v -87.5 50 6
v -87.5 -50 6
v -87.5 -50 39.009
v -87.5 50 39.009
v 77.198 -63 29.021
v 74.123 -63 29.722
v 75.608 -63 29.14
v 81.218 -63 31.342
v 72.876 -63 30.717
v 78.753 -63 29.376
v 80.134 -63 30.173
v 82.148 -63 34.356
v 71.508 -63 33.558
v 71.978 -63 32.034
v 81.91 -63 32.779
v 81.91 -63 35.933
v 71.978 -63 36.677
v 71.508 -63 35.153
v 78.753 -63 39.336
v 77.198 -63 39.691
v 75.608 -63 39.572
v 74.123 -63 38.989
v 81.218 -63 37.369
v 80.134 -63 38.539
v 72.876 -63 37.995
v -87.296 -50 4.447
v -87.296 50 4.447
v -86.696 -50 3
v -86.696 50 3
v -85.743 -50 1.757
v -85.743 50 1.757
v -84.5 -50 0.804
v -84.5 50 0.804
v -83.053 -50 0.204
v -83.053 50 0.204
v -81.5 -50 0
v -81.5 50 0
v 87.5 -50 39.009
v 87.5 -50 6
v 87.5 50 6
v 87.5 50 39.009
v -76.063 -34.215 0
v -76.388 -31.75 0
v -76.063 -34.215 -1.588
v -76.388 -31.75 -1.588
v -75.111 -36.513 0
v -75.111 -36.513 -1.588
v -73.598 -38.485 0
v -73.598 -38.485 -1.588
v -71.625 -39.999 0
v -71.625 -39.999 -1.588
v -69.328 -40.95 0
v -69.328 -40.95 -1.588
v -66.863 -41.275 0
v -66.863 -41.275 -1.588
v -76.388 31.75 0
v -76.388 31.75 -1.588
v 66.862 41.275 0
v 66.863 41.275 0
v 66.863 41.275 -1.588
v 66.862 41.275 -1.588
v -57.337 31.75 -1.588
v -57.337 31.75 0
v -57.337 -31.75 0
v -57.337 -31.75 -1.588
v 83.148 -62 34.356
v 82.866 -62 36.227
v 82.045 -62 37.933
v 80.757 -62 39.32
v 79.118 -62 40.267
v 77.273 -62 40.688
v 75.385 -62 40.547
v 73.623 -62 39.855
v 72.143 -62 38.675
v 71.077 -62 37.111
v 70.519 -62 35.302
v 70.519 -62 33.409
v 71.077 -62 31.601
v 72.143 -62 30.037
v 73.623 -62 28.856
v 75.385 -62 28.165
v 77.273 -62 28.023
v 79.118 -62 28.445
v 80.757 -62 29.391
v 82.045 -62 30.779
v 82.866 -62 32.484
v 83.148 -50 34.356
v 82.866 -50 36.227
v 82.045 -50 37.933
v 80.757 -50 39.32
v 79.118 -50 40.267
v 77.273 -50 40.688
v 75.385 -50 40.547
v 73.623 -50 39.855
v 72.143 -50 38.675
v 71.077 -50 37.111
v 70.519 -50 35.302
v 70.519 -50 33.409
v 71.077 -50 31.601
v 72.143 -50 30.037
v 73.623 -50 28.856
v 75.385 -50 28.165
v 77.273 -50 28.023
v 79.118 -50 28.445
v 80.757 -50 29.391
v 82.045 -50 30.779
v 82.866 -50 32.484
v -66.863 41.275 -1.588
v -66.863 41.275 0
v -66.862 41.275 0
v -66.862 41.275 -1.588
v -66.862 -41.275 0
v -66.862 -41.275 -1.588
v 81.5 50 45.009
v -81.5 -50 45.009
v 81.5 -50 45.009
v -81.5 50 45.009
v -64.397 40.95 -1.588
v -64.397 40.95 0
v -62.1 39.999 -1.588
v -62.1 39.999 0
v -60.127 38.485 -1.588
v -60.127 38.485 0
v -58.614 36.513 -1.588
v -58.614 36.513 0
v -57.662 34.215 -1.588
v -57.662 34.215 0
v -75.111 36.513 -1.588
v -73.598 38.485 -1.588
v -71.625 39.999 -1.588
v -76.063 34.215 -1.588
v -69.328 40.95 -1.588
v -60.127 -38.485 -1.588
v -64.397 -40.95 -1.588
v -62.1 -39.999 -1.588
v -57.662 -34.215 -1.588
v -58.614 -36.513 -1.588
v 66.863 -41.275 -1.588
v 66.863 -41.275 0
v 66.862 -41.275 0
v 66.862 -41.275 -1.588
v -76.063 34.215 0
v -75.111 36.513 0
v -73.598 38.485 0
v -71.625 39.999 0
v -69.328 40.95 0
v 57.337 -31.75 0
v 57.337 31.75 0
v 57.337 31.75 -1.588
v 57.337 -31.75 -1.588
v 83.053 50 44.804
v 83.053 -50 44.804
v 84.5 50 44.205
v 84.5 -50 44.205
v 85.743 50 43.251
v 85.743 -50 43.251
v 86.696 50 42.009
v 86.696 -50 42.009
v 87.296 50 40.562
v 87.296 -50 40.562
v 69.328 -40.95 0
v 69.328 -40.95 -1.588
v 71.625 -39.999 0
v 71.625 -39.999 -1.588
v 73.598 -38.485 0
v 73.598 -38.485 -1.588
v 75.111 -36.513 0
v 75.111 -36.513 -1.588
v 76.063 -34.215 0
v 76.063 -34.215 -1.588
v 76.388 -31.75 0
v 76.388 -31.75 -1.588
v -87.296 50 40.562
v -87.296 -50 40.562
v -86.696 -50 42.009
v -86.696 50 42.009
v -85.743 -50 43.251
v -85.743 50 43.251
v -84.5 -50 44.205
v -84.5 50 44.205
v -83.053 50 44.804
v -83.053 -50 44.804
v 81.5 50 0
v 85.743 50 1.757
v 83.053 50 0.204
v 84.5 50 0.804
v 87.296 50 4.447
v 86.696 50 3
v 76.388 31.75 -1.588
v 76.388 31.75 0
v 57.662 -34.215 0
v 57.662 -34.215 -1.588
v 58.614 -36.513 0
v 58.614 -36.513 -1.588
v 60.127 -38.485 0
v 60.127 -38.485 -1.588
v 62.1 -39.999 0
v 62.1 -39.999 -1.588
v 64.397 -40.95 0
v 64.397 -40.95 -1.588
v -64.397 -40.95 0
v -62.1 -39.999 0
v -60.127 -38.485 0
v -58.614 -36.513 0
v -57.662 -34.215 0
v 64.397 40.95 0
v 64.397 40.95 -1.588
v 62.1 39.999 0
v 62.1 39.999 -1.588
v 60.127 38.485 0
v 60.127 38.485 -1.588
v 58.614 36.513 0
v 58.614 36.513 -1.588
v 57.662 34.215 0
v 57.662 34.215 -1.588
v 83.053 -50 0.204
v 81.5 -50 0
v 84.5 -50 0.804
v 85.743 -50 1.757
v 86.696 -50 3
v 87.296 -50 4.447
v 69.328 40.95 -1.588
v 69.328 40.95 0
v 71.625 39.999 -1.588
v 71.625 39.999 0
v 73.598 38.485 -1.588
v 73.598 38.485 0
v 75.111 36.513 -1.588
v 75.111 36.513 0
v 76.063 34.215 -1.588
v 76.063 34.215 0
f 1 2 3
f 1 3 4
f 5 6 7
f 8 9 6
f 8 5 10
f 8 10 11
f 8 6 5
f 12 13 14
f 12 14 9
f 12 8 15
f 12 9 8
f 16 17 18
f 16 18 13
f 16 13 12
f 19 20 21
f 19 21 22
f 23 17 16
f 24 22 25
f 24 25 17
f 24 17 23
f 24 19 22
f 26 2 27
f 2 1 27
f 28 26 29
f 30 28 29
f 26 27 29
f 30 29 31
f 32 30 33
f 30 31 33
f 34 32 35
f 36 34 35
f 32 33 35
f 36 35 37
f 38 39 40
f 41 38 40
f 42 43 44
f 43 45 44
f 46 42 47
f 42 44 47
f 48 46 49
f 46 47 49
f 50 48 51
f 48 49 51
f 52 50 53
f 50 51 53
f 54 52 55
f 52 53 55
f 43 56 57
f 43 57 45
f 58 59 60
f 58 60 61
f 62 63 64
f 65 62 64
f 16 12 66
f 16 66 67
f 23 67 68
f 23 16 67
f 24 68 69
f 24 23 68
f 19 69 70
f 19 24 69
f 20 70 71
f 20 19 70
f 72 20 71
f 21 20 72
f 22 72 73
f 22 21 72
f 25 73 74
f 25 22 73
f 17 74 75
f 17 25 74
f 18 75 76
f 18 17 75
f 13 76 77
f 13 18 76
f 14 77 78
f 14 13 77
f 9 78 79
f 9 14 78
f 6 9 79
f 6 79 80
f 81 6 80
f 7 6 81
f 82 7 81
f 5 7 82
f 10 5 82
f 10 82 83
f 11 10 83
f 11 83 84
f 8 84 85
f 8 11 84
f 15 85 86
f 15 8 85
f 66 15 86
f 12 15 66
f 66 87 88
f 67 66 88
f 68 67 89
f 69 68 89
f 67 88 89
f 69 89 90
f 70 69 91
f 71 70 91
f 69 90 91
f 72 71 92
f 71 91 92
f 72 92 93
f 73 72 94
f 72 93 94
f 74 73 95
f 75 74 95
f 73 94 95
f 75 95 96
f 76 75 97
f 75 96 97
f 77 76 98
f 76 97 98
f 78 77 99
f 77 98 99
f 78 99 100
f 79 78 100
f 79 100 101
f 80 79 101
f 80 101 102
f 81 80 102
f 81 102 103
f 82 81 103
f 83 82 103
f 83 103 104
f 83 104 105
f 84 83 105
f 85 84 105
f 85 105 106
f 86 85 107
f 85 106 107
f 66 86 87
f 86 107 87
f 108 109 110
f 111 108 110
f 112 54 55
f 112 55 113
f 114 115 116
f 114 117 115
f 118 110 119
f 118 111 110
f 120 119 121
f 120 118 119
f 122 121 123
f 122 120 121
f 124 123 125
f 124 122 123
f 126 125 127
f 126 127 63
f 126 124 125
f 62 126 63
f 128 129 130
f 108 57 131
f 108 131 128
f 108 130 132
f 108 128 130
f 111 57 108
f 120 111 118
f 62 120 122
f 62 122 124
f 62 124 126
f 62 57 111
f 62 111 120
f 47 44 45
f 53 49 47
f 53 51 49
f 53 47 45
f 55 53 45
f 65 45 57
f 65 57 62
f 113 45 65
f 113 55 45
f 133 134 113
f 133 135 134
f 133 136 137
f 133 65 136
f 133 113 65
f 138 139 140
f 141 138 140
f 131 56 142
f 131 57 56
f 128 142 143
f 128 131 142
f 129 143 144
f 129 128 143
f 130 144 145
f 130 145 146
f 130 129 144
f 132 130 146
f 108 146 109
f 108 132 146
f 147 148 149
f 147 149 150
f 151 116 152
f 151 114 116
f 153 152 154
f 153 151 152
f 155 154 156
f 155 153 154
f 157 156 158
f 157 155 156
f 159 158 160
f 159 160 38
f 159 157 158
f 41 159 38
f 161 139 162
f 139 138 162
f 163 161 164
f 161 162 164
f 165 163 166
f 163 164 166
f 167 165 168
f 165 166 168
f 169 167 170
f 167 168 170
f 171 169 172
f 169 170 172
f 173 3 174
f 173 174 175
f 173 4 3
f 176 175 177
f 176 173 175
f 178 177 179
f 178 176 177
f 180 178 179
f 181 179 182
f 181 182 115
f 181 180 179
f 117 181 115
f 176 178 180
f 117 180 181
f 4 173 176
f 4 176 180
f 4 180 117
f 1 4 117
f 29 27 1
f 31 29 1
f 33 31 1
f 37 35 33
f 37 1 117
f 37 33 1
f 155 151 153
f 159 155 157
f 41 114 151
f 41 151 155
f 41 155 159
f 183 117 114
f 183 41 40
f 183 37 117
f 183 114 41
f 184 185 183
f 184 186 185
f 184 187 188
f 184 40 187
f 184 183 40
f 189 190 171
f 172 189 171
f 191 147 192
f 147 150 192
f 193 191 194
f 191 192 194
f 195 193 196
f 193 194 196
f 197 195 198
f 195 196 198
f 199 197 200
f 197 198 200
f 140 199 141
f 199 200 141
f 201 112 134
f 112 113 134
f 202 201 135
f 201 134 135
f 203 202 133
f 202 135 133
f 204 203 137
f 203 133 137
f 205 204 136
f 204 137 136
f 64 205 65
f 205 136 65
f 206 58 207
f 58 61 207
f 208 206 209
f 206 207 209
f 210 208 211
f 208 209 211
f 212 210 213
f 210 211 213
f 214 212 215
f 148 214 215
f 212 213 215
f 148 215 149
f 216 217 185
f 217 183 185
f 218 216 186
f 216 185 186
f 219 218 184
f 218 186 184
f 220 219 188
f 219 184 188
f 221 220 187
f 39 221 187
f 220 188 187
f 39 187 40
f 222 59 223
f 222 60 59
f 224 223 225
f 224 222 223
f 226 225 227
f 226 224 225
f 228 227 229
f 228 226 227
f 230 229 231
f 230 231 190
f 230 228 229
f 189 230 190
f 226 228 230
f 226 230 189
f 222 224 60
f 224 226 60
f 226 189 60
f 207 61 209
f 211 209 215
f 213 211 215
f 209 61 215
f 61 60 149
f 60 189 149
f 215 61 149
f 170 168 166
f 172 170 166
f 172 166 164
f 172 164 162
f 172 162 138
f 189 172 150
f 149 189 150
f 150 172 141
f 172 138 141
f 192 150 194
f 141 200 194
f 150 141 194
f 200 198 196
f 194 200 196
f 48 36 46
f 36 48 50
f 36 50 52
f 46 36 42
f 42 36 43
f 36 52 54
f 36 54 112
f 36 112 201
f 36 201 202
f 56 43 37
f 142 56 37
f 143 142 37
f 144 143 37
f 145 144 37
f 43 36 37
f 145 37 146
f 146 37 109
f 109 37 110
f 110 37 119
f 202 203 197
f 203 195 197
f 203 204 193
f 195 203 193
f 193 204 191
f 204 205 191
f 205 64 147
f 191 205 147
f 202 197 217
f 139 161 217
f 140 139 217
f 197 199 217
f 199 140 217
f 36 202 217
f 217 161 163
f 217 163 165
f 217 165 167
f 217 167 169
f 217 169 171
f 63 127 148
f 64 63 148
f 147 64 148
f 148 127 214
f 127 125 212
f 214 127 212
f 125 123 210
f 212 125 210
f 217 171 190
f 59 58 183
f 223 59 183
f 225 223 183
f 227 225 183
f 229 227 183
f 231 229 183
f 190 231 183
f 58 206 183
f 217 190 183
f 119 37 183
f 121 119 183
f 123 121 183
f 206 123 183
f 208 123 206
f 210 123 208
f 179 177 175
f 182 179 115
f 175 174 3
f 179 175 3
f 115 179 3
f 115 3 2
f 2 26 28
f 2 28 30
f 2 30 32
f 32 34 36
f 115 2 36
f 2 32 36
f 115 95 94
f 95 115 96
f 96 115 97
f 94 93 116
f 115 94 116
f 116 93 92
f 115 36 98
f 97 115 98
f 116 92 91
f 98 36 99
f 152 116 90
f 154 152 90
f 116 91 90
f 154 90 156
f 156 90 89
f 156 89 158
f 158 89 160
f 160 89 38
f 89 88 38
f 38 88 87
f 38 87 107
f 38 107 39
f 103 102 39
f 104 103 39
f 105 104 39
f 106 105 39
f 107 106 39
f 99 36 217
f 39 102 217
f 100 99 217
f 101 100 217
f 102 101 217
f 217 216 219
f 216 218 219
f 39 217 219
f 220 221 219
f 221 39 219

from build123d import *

# Parameters (mm, degrees)
F0_W     = 175
F0_H     = 100
F1_DEPTH = 45.0088
F2_R     = 6.35
F3_DEPTH = 13
F4_SIZE  = 1
F5_R     = 6
F6_W     = 19.05
F6_H     = 82.55
F7_DEPTH = 1.5875
F8_R     = 9.52499


# Not quite as in the source:
# - a fillet or chamfer is up to 0.001 mm smaller than in the source, because OpenCascade refuses the exact size
# - a length typed as a fraction of an inch, garbled in the dataset ("3 / 203.2 mm" for 3/8 in), is restored
# - a pattern or mirror of a feature is missing from the dataset's text; its kind, count and spacing are read off the source's solid


with BuildPart() as f1:
    # F0 (on Top) → F1 (new body)
    with BuildSketch(Plane.XY):
        Rectangle(F0_W, F0_H)
    extrude(amount=F1_DEPTH)

    # F2 (on face) → F3 (join)
    with BuildSketch(Plane.XZ.offset(50)):
        with Locations((76.7980482321, 34.3557204665)):
            Circle(F2_R)
    extrude(amount=F3_DEPTH)

    # F4
    f4_edges = [f1.edges().sort_by_distance(p)[0] for p in [
        (70.448048, -63, 34.35572),
    ]]
    chamfer(f4_edges, length=F4_SIZE)

    # F5
    f5_edges = [f1.edges().sort_by_distance(p)[0] for p in [
        (-87.5, 0, 45.0088),
        (87.5, 0, 45.0088),
        (87.5, 0, 0),
        (-87.5, 0, 0),
    ]]
    fillet(f5_edges, radius=F5_R)

    # F6 (on face) → F7 (join)
    with BuildSketch(Plane(origin=(0, 0, 0), x_dir=(1, 0, 0), z_dir=(0, 0, -1))):
        with Locations((-66.8625, 0)):
            Rectangle(F6_W, F6_H)
    f7 = extrude(amount=F7_DEPTH)

    # F7_copies: F7 across plane
    add(f7.mirror(Plane(origin=(0, 0, 0), x_dir=(0, 0, 1), z_dir=(1, 0, 0))))

    # F8 (radius 9.525 in the source; OpenCascade refuses exactly that, so slightly less here)
    f8_edges = [f1.edges().sort_by_distance(p)[0] for p in [
        (-76.3875, -41.275, -0.79375),
        (-57.3375, -41.275, -0.79375),
        (-76.3875, 41.275, -0.79375),
        (-57.3375, 41.275, -0.79375),
        (76.3875, -41.275, -0.79375),
        (76.3875, 41.275, -0.79375),
        (57.3375, 41.275, -0.79375),
        (57.3375, -41.275, -0.79375),
    ]]
    fillet(f8_edges, radius=F8_R)


solid = f1.part
